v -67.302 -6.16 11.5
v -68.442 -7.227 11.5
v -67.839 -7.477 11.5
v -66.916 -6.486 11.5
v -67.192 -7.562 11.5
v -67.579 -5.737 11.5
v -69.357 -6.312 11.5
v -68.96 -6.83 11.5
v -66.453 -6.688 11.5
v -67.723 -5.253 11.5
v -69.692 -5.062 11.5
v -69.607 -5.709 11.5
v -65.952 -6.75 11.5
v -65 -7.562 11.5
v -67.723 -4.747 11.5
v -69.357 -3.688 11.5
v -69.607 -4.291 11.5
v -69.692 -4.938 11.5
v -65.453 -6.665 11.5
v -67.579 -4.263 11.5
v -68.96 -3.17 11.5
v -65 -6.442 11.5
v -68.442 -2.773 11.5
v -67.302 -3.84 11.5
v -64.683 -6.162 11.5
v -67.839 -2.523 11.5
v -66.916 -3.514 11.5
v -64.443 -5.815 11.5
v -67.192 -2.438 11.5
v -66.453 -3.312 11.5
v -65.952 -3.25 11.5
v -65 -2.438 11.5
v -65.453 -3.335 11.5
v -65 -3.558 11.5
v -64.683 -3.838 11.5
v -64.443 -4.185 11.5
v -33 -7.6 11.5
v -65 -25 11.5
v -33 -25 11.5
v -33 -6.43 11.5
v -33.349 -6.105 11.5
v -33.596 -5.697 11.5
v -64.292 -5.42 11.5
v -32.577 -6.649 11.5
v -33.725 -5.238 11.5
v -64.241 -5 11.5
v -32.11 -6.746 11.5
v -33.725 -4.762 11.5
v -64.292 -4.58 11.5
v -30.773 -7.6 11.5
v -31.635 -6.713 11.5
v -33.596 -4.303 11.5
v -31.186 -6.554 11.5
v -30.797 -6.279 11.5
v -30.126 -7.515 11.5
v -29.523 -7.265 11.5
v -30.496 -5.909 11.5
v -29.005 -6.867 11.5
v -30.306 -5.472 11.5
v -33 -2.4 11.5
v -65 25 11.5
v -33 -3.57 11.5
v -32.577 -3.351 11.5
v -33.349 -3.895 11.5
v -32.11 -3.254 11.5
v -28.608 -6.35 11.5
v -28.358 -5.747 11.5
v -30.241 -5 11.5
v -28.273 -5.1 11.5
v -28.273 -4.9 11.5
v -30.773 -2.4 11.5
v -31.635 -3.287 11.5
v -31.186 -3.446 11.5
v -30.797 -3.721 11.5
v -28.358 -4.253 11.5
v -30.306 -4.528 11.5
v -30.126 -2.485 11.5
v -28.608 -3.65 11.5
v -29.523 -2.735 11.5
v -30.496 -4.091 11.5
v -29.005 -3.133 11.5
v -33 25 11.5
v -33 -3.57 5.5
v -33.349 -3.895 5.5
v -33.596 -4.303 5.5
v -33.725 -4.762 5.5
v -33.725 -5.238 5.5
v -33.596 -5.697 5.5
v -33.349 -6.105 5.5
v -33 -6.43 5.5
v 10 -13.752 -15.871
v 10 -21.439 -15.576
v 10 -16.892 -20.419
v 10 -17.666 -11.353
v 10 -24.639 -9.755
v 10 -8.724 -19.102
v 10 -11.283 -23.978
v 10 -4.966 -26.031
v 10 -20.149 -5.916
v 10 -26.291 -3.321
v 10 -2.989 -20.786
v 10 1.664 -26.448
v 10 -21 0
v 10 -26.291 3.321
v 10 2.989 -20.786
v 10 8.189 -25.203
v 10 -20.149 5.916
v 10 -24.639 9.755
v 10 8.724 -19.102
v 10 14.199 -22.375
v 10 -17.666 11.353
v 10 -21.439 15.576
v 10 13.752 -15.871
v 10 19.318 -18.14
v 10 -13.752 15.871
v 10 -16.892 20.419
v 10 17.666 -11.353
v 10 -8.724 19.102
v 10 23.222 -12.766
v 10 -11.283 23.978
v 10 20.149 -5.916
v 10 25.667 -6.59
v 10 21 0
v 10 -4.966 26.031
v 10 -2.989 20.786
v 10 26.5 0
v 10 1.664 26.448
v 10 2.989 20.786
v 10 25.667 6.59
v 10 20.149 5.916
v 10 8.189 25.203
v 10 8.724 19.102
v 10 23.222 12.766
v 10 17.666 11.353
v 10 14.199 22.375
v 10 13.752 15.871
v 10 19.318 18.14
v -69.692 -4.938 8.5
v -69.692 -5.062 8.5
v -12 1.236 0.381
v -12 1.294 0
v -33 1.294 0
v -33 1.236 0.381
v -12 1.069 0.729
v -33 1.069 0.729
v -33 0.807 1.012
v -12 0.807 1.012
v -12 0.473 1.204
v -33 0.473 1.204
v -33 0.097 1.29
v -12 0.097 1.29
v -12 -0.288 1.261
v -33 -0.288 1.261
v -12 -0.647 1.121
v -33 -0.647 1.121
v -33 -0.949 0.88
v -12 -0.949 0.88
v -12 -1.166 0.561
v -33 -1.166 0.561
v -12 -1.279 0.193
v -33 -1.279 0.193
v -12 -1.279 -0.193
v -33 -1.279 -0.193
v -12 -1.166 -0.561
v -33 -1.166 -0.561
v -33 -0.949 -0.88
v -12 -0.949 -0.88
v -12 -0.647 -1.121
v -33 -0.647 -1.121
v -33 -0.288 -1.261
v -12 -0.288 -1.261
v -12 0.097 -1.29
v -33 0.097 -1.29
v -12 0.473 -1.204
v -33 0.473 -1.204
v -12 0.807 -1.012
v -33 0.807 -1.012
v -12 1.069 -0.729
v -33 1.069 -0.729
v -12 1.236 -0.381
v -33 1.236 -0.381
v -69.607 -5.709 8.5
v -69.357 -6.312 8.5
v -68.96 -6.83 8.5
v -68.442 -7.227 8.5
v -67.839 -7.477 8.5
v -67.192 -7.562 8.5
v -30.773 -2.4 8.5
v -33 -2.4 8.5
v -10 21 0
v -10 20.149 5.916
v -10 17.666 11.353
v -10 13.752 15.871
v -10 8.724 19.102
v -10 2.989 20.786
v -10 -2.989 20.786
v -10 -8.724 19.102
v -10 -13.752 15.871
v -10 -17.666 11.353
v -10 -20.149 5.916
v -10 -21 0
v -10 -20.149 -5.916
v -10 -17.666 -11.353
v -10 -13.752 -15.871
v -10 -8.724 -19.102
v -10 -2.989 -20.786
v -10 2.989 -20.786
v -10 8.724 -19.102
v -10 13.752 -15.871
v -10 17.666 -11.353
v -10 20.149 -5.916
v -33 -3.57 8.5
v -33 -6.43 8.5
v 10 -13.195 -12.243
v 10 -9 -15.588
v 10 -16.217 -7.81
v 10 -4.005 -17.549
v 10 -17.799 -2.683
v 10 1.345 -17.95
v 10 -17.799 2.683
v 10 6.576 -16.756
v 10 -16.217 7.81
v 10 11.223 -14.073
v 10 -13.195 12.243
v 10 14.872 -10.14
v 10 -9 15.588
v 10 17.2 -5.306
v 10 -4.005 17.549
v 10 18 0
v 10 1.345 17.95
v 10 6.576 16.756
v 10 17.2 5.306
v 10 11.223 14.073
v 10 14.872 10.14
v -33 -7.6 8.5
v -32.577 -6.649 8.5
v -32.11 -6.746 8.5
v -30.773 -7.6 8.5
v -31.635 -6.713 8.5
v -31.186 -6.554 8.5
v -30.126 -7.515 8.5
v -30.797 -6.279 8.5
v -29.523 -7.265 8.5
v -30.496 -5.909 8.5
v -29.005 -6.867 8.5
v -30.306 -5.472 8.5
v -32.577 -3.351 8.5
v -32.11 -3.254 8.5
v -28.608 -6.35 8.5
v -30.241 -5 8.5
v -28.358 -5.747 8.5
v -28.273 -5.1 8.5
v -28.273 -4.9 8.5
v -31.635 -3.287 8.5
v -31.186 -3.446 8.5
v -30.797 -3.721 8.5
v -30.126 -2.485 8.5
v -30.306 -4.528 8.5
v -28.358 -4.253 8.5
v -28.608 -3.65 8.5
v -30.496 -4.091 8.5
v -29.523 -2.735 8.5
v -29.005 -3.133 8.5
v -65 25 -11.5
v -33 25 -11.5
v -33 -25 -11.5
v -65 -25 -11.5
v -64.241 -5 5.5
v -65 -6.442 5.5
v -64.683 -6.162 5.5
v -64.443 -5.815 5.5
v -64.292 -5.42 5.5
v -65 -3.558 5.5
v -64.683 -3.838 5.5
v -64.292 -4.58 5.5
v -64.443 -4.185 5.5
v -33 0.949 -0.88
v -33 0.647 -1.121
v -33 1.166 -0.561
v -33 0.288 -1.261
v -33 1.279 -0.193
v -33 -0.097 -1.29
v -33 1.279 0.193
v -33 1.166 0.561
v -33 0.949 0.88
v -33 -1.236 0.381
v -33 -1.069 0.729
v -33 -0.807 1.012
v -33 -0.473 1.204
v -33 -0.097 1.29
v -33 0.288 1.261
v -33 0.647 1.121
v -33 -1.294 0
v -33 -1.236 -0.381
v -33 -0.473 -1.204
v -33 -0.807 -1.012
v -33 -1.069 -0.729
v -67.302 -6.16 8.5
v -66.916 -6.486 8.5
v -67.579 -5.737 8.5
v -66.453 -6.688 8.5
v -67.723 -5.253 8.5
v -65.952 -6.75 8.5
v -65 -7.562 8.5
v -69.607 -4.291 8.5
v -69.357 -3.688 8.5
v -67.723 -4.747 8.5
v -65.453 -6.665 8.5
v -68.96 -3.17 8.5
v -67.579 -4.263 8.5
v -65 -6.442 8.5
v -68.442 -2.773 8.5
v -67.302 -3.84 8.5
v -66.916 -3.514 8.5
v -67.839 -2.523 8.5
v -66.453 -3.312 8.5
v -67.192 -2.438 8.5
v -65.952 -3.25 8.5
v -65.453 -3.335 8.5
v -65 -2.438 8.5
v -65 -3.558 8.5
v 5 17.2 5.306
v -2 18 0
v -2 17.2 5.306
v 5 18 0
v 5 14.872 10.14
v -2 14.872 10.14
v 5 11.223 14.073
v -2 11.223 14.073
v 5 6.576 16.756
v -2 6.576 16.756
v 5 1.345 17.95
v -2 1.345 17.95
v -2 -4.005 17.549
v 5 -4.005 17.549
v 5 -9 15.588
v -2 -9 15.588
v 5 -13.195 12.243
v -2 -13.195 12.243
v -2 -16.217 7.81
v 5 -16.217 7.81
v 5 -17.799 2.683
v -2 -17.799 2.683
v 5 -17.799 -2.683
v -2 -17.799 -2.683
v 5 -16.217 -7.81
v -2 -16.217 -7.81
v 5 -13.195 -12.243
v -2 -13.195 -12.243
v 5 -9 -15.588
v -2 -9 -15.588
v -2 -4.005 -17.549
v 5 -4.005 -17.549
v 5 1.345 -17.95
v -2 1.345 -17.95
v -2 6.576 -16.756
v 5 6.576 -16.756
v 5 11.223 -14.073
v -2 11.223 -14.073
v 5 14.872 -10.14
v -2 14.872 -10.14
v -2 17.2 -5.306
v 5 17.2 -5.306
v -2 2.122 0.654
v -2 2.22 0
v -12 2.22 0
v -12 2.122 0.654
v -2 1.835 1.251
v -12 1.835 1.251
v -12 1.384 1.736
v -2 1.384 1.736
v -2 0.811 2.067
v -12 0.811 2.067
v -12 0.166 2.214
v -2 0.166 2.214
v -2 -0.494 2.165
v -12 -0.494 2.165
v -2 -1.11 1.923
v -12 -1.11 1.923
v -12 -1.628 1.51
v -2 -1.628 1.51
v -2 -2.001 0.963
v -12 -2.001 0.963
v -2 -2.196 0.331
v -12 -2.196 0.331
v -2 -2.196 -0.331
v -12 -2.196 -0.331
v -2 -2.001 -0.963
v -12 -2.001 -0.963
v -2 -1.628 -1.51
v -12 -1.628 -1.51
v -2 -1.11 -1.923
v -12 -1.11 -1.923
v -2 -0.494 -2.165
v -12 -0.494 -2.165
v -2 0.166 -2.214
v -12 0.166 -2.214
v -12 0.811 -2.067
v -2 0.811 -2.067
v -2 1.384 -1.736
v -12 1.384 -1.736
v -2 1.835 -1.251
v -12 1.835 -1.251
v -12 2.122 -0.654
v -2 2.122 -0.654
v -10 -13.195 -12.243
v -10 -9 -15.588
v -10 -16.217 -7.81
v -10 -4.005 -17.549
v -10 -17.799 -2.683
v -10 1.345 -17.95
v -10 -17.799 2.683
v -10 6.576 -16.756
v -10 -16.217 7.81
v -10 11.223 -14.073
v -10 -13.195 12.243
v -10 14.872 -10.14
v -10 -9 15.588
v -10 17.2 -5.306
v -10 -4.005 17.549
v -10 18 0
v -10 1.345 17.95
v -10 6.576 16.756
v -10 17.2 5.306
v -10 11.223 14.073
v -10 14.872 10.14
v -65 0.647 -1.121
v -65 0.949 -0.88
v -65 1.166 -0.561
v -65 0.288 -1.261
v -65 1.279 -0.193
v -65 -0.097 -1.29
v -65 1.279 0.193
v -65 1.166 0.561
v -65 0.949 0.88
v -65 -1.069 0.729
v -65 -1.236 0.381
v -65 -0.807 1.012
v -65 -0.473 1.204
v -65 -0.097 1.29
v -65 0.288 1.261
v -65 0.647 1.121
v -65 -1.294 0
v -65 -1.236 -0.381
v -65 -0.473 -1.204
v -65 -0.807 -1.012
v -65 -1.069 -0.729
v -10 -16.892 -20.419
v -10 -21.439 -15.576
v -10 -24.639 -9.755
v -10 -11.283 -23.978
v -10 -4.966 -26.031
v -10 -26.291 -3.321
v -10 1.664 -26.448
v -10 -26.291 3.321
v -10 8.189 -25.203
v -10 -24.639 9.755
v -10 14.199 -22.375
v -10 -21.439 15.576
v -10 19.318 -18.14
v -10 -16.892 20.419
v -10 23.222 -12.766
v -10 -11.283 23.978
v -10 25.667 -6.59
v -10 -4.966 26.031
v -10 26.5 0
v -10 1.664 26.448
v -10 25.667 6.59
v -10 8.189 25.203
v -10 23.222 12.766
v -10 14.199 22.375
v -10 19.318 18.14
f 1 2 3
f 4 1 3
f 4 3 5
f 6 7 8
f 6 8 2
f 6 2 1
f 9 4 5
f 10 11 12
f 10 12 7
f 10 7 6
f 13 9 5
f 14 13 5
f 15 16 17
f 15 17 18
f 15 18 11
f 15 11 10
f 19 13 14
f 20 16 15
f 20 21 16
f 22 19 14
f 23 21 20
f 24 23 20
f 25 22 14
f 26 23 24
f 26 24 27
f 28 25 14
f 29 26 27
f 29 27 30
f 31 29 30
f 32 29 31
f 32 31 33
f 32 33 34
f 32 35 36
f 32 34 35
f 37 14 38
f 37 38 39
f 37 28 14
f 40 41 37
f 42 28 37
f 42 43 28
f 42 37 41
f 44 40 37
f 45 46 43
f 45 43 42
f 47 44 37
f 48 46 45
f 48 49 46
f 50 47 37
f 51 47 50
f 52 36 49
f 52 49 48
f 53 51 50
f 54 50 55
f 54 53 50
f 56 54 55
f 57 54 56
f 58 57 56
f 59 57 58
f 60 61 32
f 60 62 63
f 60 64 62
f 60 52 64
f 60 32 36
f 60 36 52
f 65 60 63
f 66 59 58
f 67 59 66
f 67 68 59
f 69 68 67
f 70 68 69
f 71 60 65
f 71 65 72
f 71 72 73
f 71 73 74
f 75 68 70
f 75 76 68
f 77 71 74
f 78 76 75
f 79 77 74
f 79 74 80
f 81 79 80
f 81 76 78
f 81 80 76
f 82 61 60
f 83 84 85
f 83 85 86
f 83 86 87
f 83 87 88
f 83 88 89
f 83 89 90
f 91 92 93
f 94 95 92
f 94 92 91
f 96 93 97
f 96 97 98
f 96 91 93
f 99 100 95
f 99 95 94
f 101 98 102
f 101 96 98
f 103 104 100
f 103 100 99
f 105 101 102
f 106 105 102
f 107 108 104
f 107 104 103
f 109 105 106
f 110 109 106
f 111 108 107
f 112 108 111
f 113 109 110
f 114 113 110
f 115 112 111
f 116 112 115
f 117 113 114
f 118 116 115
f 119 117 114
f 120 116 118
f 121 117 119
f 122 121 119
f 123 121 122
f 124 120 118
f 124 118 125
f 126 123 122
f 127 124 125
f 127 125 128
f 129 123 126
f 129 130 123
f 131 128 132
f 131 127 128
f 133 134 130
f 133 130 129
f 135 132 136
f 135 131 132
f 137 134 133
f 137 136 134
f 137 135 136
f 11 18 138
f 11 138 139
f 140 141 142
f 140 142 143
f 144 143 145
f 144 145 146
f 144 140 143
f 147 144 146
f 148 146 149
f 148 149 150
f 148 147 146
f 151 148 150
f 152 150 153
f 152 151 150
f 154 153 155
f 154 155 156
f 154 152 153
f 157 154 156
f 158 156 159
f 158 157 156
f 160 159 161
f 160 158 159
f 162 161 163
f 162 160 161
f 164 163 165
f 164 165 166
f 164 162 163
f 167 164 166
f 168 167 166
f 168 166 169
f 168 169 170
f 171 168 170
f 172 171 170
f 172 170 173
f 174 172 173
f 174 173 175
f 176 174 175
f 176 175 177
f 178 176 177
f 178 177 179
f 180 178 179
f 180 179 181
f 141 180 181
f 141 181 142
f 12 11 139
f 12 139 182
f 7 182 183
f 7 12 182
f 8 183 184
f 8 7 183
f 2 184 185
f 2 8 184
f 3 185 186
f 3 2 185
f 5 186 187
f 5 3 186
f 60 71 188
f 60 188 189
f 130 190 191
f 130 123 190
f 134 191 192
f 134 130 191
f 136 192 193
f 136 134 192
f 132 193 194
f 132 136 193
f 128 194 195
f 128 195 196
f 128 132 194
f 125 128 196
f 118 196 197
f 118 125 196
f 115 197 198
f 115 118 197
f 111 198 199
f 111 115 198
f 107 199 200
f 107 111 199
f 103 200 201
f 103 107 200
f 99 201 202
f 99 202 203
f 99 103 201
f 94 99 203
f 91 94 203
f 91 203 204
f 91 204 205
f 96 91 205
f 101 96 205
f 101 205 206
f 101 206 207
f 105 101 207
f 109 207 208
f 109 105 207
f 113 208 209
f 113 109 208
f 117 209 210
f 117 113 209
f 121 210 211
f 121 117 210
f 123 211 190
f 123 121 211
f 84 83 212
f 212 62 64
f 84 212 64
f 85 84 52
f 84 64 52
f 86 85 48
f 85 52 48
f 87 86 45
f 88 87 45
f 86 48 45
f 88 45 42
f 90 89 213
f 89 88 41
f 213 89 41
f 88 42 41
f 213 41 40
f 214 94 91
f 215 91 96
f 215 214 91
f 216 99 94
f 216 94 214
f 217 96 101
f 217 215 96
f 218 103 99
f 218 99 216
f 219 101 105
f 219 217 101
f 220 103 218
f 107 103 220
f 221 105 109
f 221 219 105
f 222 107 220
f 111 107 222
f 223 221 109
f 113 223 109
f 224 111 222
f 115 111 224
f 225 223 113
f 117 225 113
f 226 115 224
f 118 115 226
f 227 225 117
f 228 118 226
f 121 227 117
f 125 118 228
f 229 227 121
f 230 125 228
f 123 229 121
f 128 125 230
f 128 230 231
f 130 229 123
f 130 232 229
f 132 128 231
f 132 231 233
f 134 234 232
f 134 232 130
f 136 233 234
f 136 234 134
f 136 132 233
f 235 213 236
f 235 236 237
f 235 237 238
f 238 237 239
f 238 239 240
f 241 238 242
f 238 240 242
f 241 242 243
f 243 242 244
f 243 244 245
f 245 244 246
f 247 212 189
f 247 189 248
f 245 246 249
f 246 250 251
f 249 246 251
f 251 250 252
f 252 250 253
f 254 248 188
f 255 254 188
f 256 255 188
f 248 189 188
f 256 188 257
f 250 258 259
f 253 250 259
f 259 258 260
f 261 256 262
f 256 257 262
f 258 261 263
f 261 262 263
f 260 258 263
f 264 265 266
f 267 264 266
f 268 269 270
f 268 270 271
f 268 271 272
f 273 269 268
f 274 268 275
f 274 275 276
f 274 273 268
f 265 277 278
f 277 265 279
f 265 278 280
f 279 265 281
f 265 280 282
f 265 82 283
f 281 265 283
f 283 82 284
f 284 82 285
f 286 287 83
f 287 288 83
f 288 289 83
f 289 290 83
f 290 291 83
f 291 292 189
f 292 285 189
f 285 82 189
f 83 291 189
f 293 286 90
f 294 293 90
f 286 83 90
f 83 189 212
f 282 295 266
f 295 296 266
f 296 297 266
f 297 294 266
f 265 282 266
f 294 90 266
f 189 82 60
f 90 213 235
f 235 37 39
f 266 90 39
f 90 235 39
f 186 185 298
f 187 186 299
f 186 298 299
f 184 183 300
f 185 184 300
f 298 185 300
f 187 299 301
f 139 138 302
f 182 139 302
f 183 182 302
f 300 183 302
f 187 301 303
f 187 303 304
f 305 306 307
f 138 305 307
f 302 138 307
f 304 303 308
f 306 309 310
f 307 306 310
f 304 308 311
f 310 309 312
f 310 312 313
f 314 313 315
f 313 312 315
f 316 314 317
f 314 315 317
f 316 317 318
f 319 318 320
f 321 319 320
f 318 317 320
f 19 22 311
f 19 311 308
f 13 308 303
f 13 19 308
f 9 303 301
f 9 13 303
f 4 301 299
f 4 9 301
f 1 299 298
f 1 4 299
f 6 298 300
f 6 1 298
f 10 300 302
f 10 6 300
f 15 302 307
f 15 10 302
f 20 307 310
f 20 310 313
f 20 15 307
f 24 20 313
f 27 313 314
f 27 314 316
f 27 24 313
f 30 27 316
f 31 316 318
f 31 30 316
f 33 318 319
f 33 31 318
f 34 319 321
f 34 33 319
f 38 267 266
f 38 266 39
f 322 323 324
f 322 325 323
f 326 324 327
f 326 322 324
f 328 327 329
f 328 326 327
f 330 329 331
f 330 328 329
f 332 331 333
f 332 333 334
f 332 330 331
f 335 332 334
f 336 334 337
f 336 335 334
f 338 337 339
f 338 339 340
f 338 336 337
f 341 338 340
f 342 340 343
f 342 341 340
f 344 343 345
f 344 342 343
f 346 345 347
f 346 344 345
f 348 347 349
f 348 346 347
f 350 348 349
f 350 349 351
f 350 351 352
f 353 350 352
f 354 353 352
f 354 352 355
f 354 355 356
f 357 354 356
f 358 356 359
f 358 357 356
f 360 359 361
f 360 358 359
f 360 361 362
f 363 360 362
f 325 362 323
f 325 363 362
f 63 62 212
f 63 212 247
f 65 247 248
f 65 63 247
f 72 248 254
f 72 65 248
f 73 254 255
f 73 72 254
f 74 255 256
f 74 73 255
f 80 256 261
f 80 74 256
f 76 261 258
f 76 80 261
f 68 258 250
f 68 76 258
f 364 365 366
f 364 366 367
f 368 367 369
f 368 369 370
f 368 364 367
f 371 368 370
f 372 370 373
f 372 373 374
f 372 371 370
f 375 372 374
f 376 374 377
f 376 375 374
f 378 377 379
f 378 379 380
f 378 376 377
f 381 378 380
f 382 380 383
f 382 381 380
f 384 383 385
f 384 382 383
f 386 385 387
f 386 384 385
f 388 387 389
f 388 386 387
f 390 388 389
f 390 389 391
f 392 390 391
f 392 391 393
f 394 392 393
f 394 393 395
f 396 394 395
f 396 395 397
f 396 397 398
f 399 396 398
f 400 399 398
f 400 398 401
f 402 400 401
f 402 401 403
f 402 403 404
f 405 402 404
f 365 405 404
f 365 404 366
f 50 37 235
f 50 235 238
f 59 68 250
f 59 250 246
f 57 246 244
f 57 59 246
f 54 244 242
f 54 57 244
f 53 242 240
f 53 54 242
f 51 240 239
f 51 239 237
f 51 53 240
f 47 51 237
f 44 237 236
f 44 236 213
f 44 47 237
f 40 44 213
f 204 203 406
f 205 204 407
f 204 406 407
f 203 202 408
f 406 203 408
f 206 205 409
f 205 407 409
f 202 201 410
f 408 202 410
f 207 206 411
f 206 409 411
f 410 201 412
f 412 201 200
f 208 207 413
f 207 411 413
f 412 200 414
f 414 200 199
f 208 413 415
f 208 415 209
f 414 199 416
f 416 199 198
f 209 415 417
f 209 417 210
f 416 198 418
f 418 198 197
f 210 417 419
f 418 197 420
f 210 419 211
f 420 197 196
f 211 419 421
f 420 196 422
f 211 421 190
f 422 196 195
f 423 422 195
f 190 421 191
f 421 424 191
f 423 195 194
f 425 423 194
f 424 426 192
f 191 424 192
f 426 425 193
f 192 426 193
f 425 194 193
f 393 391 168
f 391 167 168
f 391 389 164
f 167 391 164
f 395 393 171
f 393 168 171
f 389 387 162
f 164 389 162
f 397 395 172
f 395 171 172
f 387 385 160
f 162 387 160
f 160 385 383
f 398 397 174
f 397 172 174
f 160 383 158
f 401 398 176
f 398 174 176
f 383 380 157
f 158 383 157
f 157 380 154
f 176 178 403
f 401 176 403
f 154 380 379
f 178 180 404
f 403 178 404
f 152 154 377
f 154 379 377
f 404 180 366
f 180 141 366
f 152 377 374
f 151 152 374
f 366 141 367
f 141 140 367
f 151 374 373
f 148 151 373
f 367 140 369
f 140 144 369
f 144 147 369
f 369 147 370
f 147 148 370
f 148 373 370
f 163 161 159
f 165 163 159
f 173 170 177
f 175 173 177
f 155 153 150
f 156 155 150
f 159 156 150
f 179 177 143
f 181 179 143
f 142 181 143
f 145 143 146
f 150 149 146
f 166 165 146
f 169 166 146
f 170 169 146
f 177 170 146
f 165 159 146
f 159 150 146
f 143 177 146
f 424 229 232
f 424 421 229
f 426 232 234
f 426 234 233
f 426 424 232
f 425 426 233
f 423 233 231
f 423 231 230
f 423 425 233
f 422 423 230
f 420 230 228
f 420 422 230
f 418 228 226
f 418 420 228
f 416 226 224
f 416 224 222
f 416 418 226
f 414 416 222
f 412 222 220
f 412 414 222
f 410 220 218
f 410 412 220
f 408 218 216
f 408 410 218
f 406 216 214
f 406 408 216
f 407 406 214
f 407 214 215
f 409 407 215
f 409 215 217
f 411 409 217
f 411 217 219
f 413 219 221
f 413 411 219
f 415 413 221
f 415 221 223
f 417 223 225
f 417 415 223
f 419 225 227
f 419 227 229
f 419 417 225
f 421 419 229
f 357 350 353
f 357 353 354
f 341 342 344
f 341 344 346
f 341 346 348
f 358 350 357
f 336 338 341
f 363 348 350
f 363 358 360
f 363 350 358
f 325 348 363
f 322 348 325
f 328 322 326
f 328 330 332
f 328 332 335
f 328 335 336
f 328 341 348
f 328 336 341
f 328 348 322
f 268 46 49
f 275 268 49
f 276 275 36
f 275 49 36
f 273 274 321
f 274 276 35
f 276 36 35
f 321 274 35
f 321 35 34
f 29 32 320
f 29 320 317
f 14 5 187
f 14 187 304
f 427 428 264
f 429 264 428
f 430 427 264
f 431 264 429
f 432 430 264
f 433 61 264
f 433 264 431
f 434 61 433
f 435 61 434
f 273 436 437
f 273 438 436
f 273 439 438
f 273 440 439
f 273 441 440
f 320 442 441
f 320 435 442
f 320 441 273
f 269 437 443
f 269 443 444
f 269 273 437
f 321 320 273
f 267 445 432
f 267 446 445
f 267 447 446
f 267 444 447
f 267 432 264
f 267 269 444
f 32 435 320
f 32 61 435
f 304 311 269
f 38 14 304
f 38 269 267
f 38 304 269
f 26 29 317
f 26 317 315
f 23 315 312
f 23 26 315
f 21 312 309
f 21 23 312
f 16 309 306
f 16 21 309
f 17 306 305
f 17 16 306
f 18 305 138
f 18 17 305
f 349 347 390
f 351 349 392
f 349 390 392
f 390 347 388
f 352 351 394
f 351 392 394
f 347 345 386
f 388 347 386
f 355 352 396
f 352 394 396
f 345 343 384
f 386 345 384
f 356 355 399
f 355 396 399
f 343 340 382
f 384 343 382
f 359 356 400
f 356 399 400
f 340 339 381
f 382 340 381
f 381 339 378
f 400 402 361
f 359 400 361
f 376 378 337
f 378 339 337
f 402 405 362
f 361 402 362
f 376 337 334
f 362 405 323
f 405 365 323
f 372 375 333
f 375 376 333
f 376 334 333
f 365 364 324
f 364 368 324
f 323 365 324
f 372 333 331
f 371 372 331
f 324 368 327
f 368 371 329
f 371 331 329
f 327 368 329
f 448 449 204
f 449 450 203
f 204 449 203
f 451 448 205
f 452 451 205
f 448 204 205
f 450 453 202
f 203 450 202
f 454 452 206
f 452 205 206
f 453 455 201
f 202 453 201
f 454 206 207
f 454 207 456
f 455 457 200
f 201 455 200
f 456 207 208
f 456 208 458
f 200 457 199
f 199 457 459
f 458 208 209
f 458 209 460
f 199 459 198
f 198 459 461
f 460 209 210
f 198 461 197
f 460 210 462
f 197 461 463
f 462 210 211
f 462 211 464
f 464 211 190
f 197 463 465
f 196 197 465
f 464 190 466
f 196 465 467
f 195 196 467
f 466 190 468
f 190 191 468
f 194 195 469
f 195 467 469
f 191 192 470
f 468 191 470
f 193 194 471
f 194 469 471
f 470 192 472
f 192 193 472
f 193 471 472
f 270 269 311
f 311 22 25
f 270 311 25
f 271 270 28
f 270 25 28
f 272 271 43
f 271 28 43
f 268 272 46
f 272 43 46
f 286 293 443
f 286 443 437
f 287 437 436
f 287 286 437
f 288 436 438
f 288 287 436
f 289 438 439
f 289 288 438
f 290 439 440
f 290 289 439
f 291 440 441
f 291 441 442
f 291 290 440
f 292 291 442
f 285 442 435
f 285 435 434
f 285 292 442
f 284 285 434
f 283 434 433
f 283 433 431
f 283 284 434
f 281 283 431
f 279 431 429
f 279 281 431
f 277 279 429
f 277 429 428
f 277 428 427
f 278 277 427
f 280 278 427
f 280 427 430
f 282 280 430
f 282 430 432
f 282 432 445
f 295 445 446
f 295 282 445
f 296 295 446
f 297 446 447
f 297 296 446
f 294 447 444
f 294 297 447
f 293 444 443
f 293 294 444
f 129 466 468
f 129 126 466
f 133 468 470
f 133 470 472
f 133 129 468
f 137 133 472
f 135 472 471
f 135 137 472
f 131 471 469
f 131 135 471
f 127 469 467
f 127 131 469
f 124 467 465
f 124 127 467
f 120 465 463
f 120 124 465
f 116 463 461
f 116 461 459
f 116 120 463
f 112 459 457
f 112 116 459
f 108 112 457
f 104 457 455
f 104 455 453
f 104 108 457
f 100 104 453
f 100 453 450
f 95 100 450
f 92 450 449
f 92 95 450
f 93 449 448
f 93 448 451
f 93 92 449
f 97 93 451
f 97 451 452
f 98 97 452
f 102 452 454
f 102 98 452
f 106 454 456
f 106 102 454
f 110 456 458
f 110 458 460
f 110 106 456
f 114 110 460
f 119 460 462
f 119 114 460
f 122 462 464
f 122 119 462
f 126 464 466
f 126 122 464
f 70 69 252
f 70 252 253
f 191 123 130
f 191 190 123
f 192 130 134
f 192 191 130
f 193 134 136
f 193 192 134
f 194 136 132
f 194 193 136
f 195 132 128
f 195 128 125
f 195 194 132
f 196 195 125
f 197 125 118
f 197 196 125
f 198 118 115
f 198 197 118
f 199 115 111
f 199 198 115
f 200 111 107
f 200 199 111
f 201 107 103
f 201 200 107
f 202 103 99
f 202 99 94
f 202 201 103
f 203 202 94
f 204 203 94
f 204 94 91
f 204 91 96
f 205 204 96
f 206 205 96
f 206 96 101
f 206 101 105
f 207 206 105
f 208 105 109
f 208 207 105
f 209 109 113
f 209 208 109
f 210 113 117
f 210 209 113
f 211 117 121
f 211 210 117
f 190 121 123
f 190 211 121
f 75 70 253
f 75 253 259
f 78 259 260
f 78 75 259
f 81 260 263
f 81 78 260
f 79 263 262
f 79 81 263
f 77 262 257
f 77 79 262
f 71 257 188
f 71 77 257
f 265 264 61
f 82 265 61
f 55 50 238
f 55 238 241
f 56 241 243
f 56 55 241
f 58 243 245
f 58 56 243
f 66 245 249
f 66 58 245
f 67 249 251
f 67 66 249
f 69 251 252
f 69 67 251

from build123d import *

# Parameters (mm, degrees)
F0_R          = 26.5
F0_R_2        = 21
F1_DEPTH      = 10
F2_R          = 21
F2_R_2        = 18
F3_DEPTH      = 10
F4_R          = 18
F5_DEPTH      = 5
F5_DEPTH_BACK = 2
F6_R          = 2.2204818147
F6_R_2        = 1.293911516
F7_DEPTH      = 12
F8_DEPTH      = 31
F9_W          = 50
F9_H          = 23
F9_R          = 1.293911516
F10_DEPTH     = 32
F12_DEPTH     = 6
F13_DEPTH     = 3
F14_DEPTH     = 6
F15_DEPTH     = 3


with BuildPart() as f1:
    # F0 (on Right) → F1 (new body, symmetric)
    with BuildSketch(Plane.YZ):
        Circle(F0_R)
        Circle(F0_R_2, mode=Mode.SUBTRACT)
    extrude(amount=F1_DEPTH, both=True)


with BuildPart() as f3:
    # F2 (on Right) → F3 (new body, symmetric)
    with BuildSketch(Plane.YZ):
        Circle(F2_R)
        Circle(F2_R_2, mode=Mode.SUBTRACT)
    extrude(amount=F3_DEPTH, both=True)


with BuildPart() as f5:
    # F4 (on Right) → F5 (new body, two sides)
    with BuildSketch(Plane.YZ) as f5_sk:
        Circle(F4_R)
    extrude(amount=F5_DEPTH)
    extrude(f5_sk.sketch, amount=-F5_DEPTH_BACK)

    # F6 (on Right) → F7 (join)
    with BuildSketch(Plane.YZ):
        Circle(F6_R)
        Circle(F6_R_2, mode=Mode.SUBTRACT)
    extrude(amount=-F7_DEPTH)

    # F8 (add): a face of the model
    f8_faces = [f5.faces().sort_by_distance(p)[0] for p in [
        (-2, 0, 0),
    ]]
    extrude(f8_faces, amount=F8_DEPTH)


with BuildPart() as f10:
    # F9 (on face) → F10 (new body)
    with BuildSketch(Plane(origin=(-33, 0, 0), x_dir=(0, -1, 0), z_dir=(-1, 0, 0))):
        Rectangle(F9_W, F9_H)
        Circle(F9_R, mode=Mode.SUBTRACT)
    extrude(amount=F10_DEPTH)

    # F11 (on face) → F12 (cut)
    with BuildSketch(Plane.XY.offset(11.5)):
        with BuildLine():
            ThreePointArc((-64.2413116843, -5), (-64.4425548526, -4.1852286969), (-65, -3.5578484321))
            Line((-65, -3.5578484321), (-65, -6.4421515679))
            ThreePointArc((-65, -6.4421515679), (-64.4425548526, -5.8147713031), (-64.2413116843, -5))
        make_face()
    extrude(amount=-F12_DEPTH, mode=Mode.SUBTRACT)

    # F11 (on face) → F13 (join)
    with BuildSketch(Plane.XY.offset(11.5)):
        with BuildLine():
            Line((-65, -3.5578484321), (-65, -2.4382013362))
            Line((-65, -2.4382013362), (-67.1921111245, -2.4382013362))
            ThreePointArc((-67.1921111245, -2.4382013362), (-68.9598780774, -3.1704343832), (-69.6921111245, -4.9382013362))
            Line((-69.6921111245, -4.9382013362), (-69.6921111245, -5.0617986638))
            ThreePointArc((-69.6921111245, -5.0617986638), (-68.9598780774, -6.8295656168), (-67.1921111245, -7.5617986638))
            Line((-67.1921111245, -7.5617986638), (-65, -7.5617986638))
            Line((-65, -7.5617986638), (-65, -6.4421515679))
            ThreePointArc((-65, -6.4421515679), (-67.7413116843, -5), (-65, -3.5578484321))
        make_face()
    extrude(amount=-F13_DEPTH)

    # F11 (on face) → F14 (cut)
    with BuildSketch(Plane.XY.offset(11.5)):
        with BuildLine():
            Line((-33, -6.4300517059), (-33, -3.5699482941))
            ThreePointArc((-33, -3.5699482941), (-33.7413116843, -5), (-33, -6.4300517059))
        make_face()
    extrude(amount=-F14_DEPTH, mode=Mode.SUBTRACT)

    # F11 (on face) → F15 (join)
    with BuildSketch(Plane.XY.offset(11.5)):
        with BuildLine():
            ThreePointArc((-33, -3.5699482941), (-31.1859249922, -3.4463422911), (-30.2413116843, -5))
            ThreePointArc((-30.2413116843, -5), (-31.1859249922, -6.5536577089), (-33, -6.4300517059))
            Line((-33, -6.4300517059), (-33, -7.5997256115))
            Line((-33, -7.5997256115), (-30.7731356125, -7.5997256115))
            ThreePointArc((-30.7731356125, -7.5997256115), (-29.0053686596, -6.8674925645), (-28.2731356125, -5.0997256115))
            Line((-28.2731356125, -5.0997256115), (-28.2731356125, -4.9002743885))
            ThreePointArc((-28.2731356125, -4.9002743885), (-29.0053686596, -3.1325074355), (-30.7731356125, -2.4002743885))
            Line((-30.7731356125, -2.4002743885), (-33, -2.4002743885))
            Line((-33, -2.4002743885), (-33, -3.5699482941))
        make_face()
    extrude(amount=-F15_DEPTH)


solid = Compound([f1.part, f3.part, f5.part, f10.part])
